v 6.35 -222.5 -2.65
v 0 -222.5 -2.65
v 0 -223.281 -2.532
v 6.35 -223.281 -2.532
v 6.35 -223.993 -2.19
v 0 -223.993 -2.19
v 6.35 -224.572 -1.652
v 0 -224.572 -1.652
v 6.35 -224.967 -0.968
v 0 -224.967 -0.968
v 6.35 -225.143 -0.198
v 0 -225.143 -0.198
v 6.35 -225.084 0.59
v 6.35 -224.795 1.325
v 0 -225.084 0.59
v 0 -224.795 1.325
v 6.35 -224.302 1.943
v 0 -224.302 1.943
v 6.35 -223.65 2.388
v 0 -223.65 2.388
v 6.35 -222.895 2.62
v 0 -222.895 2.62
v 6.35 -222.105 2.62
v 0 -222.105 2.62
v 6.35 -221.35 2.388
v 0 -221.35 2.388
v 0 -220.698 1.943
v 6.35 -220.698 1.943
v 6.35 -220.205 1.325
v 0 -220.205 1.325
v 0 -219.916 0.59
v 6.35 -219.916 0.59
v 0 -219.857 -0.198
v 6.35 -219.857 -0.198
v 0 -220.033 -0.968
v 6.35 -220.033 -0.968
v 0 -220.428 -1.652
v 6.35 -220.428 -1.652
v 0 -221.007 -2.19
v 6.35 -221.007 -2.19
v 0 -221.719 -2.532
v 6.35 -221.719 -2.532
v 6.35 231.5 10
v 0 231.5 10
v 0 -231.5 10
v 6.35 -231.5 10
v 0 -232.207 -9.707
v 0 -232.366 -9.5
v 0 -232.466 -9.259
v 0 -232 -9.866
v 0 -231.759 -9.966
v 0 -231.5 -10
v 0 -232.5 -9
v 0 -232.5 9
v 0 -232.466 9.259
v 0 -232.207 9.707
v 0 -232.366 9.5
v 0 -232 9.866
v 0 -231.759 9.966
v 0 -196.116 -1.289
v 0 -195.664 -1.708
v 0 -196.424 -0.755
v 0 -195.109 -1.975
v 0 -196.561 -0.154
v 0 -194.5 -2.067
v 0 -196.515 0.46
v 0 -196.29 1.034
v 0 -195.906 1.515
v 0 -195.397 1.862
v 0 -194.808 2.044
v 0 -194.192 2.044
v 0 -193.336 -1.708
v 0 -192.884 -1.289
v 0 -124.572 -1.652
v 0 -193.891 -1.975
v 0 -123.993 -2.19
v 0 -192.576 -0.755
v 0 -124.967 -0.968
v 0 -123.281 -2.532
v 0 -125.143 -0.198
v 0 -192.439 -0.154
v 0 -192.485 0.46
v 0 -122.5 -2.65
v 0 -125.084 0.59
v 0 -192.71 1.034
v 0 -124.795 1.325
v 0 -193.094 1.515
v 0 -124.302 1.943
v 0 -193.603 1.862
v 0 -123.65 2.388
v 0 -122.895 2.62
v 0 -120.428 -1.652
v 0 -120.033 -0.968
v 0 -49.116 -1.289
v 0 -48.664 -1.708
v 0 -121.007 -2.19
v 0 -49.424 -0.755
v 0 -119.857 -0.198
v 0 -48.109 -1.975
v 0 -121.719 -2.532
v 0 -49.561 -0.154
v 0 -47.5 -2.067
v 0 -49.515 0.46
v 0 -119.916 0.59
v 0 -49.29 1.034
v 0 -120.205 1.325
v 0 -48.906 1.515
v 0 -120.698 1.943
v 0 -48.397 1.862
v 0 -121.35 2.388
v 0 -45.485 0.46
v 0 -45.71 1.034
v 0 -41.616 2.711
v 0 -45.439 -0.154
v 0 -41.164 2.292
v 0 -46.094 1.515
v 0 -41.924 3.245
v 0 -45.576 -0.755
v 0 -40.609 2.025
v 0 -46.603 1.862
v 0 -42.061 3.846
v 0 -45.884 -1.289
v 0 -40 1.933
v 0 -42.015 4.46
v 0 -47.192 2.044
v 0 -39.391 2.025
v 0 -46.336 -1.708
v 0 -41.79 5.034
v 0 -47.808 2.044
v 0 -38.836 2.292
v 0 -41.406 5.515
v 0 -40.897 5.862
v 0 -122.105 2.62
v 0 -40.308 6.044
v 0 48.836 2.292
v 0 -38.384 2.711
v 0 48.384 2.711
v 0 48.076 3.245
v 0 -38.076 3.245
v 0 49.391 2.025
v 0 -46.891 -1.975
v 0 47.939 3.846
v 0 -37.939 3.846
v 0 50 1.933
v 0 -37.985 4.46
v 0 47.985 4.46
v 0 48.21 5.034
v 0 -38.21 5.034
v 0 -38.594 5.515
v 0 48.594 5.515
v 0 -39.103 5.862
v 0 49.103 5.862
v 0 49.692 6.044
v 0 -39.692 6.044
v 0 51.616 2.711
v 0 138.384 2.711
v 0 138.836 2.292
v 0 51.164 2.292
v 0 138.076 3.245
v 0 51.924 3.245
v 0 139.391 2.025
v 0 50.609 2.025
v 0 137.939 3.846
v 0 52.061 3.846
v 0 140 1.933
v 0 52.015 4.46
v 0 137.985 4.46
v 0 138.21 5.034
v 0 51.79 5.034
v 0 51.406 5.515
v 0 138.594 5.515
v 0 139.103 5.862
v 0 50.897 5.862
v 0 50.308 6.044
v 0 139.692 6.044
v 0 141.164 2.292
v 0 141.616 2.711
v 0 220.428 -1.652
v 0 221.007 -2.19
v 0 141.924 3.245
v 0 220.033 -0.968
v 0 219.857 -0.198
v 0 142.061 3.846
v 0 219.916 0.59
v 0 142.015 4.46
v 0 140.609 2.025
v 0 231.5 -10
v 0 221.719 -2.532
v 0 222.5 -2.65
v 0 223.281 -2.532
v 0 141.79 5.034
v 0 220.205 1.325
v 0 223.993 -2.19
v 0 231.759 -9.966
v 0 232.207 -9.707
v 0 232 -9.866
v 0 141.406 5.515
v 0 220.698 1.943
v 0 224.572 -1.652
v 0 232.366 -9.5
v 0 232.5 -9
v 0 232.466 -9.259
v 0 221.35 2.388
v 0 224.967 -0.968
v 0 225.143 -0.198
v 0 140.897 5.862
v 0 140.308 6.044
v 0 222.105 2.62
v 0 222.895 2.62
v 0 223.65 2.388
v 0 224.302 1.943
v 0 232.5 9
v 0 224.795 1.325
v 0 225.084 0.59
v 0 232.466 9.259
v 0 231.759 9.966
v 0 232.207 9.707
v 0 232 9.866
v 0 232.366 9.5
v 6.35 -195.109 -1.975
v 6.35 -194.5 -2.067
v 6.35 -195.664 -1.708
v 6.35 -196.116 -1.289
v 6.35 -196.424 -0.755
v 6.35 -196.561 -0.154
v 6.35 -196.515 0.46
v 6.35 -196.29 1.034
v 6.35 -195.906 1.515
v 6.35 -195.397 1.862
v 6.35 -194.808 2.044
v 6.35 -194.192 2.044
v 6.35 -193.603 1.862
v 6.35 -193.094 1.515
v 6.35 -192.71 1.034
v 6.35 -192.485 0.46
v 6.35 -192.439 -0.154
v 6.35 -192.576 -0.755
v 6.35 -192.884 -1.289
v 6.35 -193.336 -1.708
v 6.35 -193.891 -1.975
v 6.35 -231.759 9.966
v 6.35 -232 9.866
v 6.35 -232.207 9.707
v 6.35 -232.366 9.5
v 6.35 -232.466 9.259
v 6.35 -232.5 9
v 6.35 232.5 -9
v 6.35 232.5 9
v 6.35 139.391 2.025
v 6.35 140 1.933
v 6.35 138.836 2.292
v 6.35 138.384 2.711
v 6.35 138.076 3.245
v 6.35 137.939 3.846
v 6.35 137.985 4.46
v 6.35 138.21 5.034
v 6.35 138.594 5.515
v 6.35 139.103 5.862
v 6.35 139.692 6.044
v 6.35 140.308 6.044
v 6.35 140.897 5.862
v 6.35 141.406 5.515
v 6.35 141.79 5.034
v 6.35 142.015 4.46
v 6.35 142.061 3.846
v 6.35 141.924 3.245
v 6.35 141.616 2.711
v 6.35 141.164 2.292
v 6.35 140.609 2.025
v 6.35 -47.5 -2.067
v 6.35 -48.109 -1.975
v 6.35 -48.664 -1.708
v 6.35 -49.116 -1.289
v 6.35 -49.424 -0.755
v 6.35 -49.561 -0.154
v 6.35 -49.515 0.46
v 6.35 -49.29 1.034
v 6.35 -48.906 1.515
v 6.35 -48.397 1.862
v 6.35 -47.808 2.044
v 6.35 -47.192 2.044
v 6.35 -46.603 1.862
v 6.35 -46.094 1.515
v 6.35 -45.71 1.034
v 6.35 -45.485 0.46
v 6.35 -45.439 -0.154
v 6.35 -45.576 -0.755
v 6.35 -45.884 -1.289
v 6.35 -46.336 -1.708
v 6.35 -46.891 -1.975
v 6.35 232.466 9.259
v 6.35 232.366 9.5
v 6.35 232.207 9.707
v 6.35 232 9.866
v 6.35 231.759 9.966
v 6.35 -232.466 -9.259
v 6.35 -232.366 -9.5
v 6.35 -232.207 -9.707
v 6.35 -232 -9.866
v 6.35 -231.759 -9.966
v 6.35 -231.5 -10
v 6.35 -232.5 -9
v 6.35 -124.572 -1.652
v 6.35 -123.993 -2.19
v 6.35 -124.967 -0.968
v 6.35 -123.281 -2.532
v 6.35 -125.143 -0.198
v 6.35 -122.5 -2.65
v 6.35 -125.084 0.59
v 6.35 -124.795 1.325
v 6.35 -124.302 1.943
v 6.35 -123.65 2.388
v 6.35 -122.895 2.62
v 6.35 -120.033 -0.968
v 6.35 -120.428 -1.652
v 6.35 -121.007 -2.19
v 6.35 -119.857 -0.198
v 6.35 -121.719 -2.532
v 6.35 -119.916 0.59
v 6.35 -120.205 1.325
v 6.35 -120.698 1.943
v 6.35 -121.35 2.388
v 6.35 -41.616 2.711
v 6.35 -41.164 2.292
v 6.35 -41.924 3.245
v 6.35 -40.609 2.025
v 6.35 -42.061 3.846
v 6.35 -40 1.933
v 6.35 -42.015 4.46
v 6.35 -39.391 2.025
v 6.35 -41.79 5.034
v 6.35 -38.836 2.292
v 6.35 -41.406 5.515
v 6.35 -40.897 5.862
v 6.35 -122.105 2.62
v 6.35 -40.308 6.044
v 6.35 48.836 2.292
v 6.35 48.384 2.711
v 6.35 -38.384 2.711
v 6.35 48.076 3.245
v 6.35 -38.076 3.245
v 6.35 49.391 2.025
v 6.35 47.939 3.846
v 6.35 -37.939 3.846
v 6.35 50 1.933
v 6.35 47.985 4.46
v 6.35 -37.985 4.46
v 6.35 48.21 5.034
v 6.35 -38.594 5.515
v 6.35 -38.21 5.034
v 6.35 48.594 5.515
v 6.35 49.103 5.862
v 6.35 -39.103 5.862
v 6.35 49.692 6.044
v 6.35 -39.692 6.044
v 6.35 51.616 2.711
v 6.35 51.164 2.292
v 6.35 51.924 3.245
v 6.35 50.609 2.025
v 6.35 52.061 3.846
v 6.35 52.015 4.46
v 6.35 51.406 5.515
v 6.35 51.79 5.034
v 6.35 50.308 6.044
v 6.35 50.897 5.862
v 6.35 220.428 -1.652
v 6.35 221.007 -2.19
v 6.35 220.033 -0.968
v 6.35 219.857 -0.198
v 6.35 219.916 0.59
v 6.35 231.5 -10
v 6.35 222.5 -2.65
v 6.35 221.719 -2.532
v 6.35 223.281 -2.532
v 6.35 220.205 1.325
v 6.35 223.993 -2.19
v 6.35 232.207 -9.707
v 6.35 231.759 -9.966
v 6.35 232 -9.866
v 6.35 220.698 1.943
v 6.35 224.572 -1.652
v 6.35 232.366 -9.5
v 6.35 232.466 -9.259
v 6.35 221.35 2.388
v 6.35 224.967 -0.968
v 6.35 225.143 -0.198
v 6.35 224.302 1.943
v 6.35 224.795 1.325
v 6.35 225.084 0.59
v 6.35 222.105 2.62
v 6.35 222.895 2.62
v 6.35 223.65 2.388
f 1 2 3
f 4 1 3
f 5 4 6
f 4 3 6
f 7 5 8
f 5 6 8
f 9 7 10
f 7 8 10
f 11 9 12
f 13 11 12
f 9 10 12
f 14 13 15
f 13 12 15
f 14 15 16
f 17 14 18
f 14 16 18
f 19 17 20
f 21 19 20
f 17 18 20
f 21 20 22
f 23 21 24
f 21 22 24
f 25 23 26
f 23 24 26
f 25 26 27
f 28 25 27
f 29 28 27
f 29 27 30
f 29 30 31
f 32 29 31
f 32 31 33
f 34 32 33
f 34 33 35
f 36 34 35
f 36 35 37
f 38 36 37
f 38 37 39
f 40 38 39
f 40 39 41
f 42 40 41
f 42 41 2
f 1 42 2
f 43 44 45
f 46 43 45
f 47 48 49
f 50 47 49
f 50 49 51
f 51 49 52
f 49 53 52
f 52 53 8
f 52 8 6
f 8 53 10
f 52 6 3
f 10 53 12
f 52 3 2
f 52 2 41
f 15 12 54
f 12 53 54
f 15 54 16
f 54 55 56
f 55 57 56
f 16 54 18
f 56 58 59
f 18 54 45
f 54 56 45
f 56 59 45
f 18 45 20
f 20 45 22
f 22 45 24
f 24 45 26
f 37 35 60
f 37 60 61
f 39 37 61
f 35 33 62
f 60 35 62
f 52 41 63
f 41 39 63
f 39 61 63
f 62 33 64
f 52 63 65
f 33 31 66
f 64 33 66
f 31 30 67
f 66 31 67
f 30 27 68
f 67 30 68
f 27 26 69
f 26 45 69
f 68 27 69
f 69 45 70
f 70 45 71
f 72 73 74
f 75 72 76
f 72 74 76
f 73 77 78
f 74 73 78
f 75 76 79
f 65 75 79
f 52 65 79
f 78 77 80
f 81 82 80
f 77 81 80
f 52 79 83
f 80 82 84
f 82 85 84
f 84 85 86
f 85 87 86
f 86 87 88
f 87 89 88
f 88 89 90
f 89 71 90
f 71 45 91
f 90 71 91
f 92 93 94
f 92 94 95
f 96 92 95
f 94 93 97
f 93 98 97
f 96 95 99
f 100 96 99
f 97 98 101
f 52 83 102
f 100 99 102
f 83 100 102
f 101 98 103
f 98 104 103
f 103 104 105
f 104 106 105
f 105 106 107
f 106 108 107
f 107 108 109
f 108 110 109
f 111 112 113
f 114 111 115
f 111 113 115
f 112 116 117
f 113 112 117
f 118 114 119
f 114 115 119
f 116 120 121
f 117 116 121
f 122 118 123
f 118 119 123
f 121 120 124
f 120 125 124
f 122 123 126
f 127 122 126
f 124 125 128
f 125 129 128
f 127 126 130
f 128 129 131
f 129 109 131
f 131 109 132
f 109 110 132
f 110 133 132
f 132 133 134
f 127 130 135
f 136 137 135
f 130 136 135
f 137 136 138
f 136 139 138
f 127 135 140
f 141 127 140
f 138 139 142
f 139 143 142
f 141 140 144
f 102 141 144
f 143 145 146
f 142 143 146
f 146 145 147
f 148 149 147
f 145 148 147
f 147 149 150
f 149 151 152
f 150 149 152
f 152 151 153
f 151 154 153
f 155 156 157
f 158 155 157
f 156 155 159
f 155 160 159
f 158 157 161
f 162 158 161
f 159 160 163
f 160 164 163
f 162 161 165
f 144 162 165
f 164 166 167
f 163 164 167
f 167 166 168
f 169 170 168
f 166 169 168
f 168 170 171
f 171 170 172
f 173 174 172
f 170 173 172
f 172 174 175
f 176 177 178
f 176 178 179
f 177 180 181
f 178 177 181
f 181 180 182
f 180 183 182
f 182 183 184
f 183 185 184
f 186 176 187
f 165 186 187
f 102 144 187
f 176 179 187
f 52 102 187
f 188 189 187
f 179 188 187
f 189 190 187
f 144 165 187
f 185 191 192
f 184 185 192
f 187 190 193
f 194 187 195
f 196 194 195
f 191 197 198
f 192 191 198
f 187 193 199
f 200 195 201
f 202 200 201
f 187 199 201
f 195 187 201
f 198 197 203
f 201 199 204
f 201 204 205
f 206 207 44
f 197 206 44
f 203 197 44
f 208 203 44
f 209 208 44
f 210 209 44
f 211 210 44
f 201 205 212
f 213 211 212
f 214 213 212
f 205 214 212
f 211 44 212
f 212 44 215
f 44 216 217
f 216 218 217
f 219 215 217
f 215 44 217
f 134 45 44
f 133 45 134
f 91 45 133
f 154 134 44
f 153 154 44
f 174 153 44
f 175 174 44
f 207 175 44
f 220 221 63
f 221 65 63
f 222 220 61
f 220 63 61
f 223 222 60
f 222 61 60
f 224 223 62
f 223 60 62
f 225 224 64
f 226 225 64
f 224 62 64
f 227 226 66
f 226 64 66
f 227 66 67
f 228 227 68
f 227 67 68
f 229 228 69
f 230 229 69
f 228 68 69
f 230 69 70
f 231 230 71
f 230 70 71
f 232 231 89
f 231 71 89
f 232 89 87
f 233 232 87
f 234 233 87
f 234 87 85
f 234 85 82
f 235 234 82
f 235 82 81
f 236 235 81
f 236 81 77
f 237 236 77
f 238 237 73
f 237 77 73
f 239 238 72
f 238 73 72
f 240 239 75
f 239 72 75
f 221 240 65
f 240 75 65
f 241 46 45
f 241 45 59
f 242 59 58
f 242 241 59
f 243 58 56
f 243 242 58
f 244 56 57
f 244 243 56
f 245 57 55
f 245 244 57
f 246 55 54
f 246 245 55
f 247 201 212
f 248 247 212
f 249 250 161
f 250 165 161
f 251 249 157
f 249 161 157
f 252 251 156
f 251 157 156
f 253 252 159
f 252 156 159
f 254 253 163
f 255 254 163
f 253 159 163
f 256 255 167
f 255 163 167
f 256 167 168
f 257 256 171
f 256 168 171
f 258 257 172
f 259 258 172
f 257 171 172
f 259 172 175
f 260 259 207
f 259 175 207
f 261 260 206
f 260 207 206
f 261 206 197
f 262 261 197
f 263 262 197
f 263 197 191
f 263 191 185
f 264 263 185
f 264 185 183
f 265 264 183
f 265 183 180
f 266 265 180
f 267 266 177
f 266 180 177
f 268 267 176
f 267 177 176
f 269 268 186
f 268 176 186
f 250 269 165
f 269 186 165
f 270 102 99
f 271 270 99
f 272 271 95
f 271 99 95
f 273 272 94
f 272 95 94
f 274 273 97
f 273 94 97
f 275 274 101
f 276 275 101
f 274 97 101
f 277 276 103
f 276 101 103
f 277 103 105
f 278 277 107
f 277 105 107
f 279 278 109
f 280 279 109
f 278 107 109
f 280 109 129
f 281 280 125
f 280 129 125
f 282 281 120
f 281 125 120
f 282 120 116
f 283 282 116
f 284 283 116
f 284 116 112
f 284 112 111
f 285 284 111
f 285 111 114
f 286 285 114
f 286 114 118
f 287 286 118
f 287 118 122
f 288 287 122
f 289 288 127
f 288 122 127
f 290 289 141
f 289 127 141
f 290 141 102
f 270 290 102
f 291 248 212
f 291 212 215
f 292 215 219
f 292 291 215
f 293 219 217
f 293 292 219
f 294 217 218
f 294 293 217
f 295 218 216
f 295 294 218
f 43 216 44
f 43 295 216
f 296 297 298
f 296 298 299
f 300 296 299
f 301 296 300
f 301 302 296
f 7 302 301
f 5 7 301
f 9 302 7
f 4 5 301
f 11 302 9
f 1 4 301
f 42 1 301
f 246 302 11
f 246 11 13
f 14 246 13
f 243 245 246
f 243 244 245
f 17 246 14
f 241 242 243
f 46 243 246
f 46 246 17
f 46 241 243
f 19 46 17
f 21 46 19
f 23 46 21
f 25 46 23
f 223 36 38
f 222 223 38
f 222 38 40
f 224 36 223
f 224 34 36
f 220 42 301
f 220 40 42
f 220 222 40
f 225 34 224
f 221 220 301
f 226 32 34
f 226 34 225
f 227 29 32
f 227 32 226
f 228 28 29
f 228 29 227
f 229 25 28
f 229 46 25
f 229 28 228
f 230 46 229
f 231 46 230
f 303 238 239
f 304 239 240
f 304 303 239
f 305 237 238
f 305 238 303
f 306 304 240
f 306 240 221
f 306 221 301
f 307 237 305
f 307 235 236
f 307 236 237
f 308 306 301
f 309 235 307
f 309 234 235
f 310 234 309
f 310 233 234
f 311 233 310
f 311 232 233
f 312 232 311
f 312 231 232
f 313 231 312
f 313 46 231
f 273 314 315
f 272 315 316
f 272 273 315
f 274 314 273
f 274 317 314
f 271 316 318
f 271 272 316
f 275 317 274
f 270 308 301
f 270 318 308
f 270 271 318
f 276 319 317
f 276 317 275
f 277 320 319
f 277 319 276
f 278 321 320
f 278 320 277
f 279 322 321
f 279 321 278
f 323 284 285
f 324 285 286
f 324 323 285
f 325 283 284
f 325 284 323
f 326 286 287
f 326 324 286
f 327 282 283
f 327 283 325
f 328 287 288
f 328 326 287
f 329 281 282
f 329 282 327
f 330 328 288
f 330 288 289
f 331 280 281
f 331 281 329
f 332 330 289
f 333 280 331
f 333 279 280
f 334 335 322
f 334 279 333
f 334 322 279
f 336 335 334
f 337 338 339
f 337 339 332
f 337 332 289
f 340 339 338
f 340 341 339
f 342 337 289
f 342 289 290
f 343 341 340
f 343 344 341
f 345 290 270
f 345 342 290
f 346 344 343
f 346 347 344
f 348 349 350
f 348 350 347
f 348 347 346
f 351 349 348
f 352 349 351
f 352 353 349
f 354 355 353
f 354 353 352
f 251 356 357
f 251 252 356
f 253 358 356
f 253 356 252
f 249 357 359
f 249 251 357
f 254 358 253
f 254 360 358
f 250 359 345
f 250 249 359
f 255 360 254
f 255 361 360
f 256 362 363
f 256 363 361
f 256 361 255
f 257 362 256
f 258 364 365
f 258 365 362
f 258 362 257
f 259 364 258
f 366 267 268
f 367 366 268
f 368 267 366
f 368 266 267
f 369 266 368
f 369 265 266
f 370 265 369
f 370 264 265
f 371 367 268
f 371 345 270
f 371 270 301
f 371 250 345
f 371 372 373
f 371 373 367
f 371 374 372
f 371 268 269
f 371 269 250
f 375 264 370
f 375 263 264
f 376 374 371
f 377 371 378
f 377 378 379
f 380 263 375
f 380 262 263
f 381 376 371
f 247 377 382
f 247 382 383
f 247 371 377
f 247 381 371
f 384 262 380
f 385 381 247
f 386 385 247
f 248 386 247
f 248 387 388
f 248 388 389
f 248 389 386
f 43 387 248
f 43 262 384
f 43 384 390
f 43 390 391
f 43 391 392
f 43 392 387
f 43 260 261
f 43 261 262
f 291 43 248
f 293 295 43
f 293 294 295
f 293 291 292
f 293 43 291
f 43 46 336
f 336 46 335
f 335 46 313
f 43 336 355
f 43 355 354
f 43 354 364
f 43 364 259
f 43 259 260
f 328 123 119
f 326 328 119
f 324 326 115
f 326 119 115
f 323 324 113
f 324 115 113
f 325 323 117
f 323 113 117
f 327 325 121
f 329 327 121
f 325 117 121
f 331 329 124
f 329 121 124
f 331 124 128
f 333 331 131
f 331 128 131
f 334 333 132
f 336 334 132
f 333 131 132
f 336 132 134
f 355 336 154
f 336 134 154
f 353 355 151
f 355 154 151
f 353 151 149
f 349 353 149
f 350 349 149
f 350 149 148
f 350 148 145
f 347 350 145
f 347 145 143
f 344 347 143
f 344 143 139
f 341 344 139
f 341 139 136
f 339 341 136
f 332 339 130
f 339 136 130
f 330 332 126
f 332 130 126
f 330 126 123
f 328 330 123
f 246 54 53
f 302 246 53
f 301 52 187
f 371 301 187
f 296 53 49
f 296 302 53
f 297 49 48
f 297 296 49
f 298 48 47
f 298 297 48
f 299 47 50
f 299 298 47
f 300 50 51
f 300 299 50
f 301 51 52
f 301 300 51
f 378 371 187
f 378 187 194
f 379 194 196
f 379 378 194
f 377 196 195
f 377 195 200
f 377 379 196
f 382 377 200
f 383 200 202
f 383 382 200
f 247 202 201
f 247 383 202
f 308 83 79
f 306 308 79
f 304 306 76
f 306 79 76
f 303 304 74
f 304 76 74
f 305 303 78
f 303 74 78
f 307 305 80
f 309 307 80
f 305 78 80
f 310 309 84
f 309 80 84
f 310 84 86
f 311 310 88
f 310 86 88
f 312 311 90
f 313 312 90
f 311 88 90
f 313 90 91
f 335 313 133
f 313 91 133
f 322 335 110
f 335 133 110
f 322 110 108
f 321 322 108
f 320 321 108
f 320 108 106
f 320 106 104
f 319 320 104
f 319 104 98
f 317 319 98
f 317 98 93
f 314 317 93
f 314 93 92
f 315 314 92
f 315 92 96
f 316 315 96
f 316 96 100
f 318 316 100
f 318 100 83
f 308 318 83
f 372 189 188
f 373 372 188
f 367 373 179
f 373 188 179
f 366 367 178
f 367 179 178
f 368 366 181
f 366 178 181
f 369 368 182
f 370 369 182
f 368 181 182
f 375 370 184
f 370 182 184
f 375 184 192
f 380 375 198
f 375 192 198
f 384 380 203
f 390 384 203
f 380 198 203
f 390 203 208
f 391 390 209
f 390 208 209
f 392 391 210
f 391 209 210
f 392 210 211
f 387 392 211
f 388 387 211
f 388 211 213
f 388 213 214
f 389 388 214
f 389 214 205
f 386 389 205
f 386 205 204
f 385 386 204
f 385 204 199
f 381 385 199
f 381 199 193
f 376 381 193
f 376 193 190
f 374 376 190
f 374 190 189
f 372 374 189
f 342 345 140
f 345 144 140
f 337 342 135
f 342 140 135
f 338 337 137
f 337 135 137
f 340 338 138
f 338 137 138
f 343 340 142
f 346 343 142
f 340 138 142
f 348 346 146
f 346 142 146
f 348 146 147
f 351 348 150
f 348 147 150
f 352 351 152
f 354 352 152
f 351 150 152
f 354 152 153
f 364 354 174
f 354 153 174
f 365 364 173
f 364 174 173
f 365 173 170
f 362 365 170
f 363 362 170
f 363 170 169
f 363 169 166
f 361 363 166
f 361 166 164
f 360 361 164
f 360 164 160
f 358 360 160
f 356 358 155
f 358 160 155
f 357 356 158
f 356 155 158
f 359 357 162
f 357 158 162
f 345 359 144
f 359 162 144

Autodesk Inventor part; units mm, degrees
ref_plane "YZ Plane" through (0, 0, 0) normal (1, 0, 0) x (0, 1, 0)
ref_plane "XZ Plane" through (0, 0, 0) normal (0, 1, 0) x (-1, 0, 0)
ref_plane "XY Plane" through (0, 0, 0) normal (0, 0, 1) x (1, 0, 0)
sketch "Sketch1" plane through (0, 0, 0) normal (1, 0, 0) x (0, 1, 0)
  line L0 (-232.5, -10) -> (232.5, -10)
  line L1 (232.5, -10) -> (232.5, 10)
  line L2 (232.5, 10) -> (-232.5, 10)
  line L3 (-232.5, 10) -> (-232.5, -10)
  line L4 (-232.5, -10) -> (232.5, 10) construction
  line L5 (232.5, -10) -> (-232.5, 10) construction
  point P0 (0, 0)
  dimension "d0" = 465
  dimension "d1" = 20
extrude "Extrusion1" add sketch "Sketch1" along normal blind 6.35
sketch "Sketch2" plane through (6.35, 0, 0) normal (1, 0, 0) x (0, 0, -1)
  line L0 (10, 232.5) -> (-10, 232.5) projected
  line L1 (-10, 232.5) -> (-10, -232.5) projected
  line L2 (-10, -232.5) -> (10, -232.5) projected
  line L3 (10, -232.5) -> (10, 232.5) projected
  point P0 (0, 0)
  point P1 (0, 222.5)
  point P2 (0, 232.5)
  point P3 (0, -222.5)
  point P4 (0, -122.5)
  dimension "d4" = 10
  dimension "d5" = 10
  dimension "d6" = 100
hole "Hole1" at (6.35, 222.5, 0) at (6.35, -222.5, 0) at (6.35, -122.5, 0) direction (-1, 0, 0) diameter 5.3 end through all
sketch "Sketch3" plane through (6.35, 0, 0) normal (1, 0, 0) x (0, 0, -1)
  circle A0 centre (0, -122.5) radius 2.65 projected
  circle A1 centre (0, -222.5) radius 2.65 projected
  circle A2 centre (0, 222.5) radius 2.65 projected
  line L0 (10, 232.5) -> (-10, 232.5) projected
  line L1 (-10, 232.5) -> (-10, -232.5) projected
  line L2 (-10, -232.5) -> (10, -232.5) projected
  line L3 (10, -232.5) -> (10, 232.5) projected
  point P0 (0, 0)
  point P1 (0, -194.5)
  point P2 (0, -47.5)
  dimension "d14" = 72
  dimension "d22" = 147
hole "Hole2" at (6.35, -194.5, 0) at (6.35, -47.5, 0) direction (-1, 0, 0) diameter 4.134 end through all thread size "M5x0.8" class "6H" standard "ANSI Metric M Profile"
fillet "Fillet1" radius 1 4 edges at (3.175, -232.5, 10) (3.175, -232.5, -10) (3.175, 232.5, 10) (3.175, 232.5, -10)
sketch "Sketch4" plane through (6.35, 0, 0) normal (1, 0, 0) x (0, 0, -1)
  circle A0 centre (0, 222.5) radius 2.65 projected
  line L0 (-4, 140) -> (-4, -40) construction
  line L1 (-10, 231.5) -> (-10, -231.5) projected
  line L2 (0, 222.5) -> (0, -122.5) construction
  circle A1 centre (0, -122.5) radius 2.65 projected
  point P0 (0, 0)
  point P1 (-4, 50)
  point P2 (0, 50)
  point P3 (-4, 50)
  dimension "d24" = 180
  dimension "d25" = 6
hole "Hole3" at (6.35, 140, 4) at (6.35, 50, 4) at (6.35, -40, 4) direction (-1, 0, 0) diameter 4.134 end through all thread size "M5x0.8" class "6H" standard "ANSI Metric M Profile"
properties part number "Door Aluminum Bars" material "Aluminum 6061"
